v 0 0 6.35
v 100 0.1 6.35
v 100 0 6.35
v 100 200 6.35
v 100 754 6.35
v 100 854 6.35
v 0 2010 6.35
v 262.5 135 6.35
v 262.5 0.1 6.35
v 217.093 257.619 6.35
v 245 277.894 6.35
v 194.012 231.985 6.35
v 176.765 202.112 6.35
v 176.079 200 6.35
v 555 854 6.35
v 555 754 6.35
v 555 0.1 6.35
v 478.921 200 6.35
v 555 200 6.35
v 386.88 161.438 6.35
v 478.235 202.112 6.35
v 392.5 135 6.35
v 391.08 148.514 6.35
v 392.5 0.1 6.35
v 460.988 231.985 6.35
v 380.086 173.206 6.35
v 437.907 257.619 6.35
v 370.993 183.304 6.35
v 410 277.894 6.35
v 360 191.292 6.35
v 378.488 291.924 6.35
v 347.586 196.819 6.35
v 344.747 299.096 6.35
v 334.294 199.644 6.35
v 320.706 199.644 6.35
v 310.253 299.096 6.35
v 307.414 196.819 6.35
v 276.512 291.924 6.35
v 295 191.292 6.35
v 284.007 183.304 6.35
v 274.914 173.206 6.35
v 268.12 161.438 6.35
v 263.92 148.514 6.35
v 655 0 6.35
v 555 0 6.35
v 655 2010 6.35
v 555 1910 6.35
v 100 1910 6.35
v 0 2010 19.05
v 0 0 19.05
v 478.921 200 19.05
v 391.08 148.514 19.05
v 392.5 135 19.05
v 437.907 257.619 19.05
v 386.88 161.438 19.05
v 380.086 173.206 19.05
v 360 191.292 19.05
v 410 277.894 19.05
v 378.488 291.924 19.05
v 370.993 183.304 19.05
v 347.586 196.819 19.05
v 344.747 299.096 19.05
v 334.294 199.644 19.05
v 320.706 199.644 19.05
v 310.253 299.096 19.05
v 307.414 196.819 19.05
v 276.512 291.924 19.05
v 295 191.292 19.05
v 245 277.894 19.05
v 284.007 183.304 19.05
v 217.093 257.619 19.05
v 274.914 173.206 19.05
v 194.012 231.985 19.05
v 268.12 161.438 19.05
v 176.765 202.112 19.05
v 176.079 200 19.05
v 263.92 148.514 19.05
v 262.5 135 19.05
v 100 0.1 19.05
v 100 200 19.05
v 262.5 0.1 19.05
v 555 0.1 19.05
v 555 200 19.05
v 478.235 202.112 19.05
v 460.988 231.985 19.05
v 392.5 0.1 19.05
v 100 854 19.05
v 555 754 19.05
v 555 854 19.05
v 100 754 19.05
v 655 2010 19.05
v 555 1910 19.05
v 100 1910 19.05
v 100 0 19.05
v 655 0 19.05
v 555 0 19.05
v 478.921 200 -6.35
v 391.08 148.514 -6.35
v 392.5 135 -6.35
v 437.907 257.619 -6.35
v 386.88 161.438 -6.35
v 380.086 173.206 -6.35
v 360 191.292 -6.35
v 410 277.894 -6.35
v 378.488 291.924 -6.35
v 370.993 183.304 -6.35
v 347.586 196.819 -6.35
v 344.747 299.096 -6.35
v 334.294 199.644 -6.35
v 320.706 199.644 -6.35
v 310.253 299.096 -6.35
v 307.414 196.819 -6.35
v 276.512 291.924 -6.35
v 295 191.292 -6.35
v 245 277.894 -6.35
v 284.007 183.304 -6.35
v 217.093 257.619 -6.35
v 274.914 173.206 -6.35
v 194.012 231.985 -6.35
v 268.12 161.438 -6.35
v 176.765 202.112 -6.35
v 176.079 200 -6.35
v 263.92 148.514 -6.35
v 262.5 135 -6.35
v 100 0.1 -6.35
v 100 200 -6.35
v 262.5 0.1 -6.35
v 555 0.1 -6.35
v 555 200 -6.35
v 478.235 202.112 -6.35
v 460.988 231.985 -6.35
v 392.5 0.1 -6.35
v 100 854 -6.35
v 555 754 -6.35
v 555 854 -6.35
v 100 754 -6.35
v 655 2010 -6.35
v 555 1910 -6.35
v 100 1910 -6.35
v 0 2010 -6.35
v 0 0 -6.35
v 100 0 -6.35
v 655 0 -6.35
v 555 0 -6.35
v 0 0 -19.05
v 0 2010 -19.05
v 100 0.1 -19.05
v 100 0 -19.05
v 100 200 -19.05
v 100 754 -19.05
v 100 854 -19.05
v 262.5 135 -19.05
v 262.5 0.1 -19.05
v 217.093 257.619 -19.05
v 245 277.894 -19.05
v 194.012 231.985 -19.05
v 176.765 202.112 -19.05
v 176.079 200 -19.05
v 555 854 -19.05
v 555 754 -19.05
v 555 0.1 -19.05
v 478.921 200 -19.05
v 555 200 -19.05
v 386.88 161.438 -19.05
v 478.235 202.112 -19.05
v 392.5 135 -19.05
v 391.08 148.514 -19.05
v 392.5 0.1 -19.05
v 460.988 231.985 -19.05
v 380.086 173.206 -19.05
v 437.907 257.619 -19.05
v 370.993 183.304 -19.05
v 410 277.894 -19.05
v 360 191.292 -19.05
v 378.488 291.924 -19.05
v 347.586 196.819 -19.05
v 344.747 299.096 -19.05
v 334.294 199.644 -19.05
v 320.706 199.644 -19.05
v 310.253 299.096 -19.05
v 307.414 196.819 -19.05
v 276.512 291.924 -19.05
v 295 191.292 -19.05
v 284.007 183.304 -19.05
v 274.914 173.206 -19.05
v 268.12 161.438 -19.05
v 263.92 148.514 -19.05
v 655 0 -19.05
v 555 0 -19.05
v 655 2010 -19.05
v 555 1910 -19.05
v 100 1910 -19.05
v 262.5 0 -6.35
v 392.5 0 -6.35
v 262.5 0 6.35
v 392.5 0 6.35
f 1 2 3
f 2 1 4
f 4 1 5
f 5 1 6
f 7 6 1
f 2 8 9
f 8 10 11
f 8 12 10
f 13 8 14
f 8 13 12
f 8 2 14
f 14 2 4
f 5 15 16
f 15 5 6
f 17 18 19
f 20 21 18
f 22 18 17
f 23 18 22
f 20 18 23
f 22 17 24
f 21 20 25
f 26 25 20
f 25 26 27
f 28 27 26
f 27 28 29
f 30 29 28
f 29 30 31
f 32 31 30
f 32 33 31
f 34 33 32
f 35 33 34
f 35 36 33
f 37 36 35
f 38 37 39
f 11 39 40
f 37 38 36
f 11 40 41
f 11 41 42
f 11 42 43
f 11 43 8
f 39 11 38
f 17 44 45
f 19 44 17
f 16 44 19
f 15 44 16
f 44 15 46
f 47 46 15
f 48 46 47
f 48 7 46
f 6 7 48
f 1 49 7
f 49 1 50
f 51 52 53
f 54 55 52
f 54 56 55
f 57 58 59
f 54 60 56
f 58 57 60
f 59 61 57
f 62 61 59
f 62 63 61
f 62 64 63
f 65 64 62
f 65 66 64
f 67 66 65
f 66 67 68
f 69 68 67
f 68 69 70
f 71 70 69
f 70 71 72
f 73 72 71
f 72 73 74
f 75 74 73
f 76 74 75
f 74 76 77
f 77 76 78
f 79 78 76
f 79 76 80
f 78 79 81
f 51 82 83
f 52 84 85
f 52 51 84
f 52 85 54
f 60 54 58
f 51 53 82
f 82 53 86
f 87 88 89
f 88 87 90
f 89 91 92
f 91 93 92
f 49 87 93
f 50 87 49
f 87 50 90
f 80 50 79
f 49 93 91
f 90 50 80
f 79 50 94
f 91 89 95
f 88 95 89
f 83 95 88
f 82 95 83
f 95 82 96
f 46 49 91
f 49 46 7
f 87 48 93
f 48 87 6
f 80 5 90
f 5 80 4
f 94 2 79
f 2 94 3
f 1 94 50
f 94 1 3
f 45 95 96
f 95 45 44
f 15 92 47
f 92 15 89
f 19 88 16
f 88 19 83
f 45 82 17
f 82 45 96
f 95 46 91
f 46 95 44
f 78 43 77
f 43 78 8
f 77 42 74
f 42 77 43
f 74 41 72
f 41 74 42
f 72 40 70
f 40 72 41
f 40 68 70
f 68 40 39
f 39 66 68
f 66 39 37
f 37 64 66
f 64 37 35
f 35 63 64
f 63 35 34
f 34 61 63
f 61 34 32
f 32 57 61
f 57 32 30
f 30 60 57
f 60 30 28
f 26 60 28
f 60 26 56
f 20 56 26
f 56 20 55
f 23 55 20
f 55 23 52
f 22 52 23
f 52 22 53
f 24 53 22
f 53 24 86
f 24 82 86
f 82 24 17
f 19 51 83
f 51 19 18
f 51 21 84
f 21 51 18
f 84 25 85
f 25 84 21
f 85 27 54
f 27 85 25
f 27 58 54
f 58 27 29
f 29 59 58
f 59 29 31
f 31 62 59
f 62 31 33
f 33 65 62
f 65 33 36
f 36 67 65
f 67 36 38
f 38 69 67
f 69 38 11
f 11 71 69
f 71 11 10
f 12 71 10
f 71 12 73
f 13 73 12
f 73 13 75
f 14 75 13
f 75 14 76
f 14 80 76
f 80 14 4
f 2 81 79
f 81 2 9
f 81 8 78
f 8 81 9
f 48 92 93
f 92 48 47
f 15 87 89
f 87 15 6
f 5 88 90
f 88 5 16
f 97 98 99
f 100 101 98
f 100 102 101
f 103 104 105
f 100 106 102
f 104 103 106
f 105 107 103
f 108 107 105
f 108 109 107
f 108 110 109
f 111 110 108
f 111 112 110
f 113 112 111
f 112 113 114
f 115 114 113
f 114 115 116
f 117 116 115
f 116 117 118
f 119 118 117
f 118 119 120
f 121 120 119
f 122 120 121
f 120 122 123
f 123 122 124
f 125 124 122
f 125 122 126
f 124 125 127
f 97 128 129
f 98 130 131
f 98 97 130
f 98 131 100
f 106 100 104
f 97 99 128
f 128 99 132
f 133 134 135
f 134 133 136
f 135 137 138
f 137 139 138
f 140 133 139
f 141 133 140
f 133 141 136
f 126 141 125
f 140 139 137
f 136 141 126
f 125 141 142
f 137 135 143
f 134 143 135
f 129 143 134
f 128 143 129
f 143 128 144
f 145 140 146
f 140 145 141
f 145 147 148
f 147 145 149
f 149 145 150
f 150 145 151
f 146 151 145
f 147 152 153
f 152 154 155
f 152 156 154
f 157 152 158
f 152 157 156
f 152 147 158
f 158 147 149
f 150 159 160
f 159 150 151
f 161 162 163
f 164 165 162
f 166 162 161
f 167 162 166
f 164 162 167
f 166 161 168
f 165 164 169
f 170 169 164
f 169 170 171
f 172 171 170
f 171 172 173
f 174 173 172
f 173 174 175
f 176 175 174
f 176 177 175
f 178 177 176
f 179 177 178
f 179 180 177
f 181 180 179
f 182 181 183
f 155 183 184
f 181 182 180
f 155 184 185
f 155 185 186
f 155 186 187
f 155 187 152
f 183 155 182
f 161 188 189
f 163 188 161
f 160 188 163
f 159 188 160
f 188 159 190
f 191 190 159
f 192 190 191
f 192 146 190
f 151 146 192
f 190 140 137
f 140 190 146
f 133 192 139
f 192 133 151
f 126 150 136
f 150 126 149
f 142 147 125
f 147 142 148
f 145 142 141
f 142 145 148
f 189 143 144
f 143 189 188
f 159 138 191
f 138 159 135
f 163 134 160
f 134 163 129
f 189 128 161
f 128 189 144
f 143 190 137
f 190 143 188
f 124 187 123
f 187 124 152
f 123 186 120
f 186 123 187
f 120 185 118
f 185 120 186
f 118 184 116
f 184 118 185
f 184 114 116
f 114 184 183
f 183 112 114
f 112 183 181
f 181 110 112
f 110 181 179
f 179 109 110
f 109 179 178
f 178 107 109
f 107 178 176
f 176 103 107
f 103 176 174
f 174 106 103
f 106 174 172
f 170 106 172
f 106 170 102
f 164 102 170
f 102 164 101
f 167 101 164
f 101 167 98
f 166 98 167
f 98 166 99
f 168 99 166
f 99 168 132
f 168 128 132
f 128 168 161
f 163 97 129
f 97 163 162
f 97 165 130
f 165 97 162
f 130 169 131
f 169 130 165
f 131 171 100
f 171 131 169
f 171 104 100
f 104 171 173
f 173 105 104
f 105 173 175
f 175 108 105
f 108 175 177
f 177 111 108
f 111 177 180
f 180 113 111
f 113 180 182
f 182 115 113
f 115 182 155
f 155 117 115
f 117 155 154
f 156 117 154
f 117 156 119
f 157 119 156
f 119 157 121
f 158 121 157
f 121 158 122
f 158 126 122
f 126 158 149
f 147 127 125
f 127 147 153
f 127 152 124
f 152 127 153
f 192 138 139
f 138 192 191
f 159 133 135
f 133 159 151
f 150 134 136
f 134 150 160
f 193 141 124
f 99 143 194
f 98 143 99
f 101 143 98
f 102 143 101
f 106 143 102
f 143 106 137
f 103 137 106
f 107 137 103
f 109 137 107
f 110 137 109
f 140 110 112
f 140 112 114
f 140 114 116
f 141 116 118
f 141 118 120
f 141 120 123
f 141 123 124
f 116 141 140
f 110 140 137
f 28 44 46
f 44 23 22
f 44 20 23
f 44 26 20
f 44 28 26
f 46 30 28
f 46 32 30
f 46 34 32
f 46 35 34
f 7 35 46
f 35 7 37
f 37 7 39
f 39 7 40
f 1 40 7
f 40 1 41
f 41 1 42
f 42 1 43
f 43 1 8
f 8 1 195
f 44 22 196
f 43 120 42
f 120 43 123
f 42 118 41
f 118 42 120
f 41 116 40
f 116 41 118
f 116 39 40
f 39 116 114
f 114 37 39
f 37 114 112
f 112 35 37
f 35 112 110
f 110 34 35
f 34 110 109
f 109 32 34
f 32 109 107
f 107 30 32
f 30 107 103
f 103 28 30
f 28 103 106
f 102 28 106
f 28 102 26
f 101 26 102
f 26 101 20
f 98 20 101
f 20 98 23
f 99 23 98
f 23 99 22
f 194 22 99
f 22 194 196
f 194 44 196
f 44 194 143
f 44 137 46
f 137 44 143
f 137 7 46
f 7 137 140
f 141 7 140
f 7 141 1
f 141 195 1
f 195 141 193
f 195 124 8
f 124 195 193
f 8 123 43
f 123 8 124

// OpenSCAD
door_x=655;
door_y=2010;

stile=100;

top_rail=stile;
intermediate_rail=stile;
lock_rail=stile;
bottom_rail=stile*2;
mullion=0; // center stile

lock=door_y*0.4;

rail=door_x-stile*2;

in=25.4;
pad=0.1;

wood=in/2;

cat_x=130;
cat_y=200;

cat_wall=stile;

module cat() {
    translate([door_x/2,0]) {
        translate([0,cat_y-cat_x/2])
        circle(d=cat_x);
        translate([-cat_x/2,0])
        square([cat_x,cat_y-cat_x/2]);
    }
}

module dirror_x(x=0) {
    children();
    translate([x,0])
    mirror([1,0])
    children();
}

module dirror_y(y=0) {
    children();
    translate([0,y])
    mirror([0,1])
    children();
}

module dirror_z() {
    children();
    mirror([0,0,1])
    children();
}

module face() {

    color("gray")
    dirror_x(door_x)
    wood()
    stile();

    translate([stile,0])
    wood()
    bottom_rail();

    translate([stile,door_y-stile])
    wood()
    top_rail();

    translate([stile,lock-stile/2])
    wood()
    lock_rail();
}

module lock_rail() {
    square([rail,lock_rail]);
}

module top_rail() {
    square([rail,top_rail]);
}

module bottom_rail() {
    difference() {
        union() {
            square([rail,bottom_rail]);
            translate([rail/2,cat_y-cat_x/2])
            circle(d=cat_x+cat_wall*2);
        }
        translate([-stile,0])
        cat();
        translate([0,pad-cat_wall*4])
        square([rail,cat_wall*4]);
        
    }
}

module stile() {
    square([stile,door_y]);
}

module wood(height=wood) {
    linear_extrude(height=height)
    children();
}

plywood_x=8*12*in;
plywood_y=4*12*in;

module center() {
    difference() {
        square([door_x,door_y]);
        cat();
    }
}

module assembled() {
    color("cyan")
    translate([0,0,-wood/2])
    wood()
    center();

    dirror_z()
    translate([0,0,wood/2])
    face();
}

stiles=4;
cutgap=in;

//cutsheet();
module cutsheet() {
    color("tan")
    translate([0,0,-2])
    square([plywood_x,plywood_y]);
    
    translate([0,door_x,0])
    rotate([0,0,-90])
    center();

    translate([door_y,door_x+cutgap])
    rotate([0,0,90])
    for(n=[1:1:stiles])
    translate([stile*n-stile+cutgap*n-cutgap,0])
    stile();
    
}

assembled();
